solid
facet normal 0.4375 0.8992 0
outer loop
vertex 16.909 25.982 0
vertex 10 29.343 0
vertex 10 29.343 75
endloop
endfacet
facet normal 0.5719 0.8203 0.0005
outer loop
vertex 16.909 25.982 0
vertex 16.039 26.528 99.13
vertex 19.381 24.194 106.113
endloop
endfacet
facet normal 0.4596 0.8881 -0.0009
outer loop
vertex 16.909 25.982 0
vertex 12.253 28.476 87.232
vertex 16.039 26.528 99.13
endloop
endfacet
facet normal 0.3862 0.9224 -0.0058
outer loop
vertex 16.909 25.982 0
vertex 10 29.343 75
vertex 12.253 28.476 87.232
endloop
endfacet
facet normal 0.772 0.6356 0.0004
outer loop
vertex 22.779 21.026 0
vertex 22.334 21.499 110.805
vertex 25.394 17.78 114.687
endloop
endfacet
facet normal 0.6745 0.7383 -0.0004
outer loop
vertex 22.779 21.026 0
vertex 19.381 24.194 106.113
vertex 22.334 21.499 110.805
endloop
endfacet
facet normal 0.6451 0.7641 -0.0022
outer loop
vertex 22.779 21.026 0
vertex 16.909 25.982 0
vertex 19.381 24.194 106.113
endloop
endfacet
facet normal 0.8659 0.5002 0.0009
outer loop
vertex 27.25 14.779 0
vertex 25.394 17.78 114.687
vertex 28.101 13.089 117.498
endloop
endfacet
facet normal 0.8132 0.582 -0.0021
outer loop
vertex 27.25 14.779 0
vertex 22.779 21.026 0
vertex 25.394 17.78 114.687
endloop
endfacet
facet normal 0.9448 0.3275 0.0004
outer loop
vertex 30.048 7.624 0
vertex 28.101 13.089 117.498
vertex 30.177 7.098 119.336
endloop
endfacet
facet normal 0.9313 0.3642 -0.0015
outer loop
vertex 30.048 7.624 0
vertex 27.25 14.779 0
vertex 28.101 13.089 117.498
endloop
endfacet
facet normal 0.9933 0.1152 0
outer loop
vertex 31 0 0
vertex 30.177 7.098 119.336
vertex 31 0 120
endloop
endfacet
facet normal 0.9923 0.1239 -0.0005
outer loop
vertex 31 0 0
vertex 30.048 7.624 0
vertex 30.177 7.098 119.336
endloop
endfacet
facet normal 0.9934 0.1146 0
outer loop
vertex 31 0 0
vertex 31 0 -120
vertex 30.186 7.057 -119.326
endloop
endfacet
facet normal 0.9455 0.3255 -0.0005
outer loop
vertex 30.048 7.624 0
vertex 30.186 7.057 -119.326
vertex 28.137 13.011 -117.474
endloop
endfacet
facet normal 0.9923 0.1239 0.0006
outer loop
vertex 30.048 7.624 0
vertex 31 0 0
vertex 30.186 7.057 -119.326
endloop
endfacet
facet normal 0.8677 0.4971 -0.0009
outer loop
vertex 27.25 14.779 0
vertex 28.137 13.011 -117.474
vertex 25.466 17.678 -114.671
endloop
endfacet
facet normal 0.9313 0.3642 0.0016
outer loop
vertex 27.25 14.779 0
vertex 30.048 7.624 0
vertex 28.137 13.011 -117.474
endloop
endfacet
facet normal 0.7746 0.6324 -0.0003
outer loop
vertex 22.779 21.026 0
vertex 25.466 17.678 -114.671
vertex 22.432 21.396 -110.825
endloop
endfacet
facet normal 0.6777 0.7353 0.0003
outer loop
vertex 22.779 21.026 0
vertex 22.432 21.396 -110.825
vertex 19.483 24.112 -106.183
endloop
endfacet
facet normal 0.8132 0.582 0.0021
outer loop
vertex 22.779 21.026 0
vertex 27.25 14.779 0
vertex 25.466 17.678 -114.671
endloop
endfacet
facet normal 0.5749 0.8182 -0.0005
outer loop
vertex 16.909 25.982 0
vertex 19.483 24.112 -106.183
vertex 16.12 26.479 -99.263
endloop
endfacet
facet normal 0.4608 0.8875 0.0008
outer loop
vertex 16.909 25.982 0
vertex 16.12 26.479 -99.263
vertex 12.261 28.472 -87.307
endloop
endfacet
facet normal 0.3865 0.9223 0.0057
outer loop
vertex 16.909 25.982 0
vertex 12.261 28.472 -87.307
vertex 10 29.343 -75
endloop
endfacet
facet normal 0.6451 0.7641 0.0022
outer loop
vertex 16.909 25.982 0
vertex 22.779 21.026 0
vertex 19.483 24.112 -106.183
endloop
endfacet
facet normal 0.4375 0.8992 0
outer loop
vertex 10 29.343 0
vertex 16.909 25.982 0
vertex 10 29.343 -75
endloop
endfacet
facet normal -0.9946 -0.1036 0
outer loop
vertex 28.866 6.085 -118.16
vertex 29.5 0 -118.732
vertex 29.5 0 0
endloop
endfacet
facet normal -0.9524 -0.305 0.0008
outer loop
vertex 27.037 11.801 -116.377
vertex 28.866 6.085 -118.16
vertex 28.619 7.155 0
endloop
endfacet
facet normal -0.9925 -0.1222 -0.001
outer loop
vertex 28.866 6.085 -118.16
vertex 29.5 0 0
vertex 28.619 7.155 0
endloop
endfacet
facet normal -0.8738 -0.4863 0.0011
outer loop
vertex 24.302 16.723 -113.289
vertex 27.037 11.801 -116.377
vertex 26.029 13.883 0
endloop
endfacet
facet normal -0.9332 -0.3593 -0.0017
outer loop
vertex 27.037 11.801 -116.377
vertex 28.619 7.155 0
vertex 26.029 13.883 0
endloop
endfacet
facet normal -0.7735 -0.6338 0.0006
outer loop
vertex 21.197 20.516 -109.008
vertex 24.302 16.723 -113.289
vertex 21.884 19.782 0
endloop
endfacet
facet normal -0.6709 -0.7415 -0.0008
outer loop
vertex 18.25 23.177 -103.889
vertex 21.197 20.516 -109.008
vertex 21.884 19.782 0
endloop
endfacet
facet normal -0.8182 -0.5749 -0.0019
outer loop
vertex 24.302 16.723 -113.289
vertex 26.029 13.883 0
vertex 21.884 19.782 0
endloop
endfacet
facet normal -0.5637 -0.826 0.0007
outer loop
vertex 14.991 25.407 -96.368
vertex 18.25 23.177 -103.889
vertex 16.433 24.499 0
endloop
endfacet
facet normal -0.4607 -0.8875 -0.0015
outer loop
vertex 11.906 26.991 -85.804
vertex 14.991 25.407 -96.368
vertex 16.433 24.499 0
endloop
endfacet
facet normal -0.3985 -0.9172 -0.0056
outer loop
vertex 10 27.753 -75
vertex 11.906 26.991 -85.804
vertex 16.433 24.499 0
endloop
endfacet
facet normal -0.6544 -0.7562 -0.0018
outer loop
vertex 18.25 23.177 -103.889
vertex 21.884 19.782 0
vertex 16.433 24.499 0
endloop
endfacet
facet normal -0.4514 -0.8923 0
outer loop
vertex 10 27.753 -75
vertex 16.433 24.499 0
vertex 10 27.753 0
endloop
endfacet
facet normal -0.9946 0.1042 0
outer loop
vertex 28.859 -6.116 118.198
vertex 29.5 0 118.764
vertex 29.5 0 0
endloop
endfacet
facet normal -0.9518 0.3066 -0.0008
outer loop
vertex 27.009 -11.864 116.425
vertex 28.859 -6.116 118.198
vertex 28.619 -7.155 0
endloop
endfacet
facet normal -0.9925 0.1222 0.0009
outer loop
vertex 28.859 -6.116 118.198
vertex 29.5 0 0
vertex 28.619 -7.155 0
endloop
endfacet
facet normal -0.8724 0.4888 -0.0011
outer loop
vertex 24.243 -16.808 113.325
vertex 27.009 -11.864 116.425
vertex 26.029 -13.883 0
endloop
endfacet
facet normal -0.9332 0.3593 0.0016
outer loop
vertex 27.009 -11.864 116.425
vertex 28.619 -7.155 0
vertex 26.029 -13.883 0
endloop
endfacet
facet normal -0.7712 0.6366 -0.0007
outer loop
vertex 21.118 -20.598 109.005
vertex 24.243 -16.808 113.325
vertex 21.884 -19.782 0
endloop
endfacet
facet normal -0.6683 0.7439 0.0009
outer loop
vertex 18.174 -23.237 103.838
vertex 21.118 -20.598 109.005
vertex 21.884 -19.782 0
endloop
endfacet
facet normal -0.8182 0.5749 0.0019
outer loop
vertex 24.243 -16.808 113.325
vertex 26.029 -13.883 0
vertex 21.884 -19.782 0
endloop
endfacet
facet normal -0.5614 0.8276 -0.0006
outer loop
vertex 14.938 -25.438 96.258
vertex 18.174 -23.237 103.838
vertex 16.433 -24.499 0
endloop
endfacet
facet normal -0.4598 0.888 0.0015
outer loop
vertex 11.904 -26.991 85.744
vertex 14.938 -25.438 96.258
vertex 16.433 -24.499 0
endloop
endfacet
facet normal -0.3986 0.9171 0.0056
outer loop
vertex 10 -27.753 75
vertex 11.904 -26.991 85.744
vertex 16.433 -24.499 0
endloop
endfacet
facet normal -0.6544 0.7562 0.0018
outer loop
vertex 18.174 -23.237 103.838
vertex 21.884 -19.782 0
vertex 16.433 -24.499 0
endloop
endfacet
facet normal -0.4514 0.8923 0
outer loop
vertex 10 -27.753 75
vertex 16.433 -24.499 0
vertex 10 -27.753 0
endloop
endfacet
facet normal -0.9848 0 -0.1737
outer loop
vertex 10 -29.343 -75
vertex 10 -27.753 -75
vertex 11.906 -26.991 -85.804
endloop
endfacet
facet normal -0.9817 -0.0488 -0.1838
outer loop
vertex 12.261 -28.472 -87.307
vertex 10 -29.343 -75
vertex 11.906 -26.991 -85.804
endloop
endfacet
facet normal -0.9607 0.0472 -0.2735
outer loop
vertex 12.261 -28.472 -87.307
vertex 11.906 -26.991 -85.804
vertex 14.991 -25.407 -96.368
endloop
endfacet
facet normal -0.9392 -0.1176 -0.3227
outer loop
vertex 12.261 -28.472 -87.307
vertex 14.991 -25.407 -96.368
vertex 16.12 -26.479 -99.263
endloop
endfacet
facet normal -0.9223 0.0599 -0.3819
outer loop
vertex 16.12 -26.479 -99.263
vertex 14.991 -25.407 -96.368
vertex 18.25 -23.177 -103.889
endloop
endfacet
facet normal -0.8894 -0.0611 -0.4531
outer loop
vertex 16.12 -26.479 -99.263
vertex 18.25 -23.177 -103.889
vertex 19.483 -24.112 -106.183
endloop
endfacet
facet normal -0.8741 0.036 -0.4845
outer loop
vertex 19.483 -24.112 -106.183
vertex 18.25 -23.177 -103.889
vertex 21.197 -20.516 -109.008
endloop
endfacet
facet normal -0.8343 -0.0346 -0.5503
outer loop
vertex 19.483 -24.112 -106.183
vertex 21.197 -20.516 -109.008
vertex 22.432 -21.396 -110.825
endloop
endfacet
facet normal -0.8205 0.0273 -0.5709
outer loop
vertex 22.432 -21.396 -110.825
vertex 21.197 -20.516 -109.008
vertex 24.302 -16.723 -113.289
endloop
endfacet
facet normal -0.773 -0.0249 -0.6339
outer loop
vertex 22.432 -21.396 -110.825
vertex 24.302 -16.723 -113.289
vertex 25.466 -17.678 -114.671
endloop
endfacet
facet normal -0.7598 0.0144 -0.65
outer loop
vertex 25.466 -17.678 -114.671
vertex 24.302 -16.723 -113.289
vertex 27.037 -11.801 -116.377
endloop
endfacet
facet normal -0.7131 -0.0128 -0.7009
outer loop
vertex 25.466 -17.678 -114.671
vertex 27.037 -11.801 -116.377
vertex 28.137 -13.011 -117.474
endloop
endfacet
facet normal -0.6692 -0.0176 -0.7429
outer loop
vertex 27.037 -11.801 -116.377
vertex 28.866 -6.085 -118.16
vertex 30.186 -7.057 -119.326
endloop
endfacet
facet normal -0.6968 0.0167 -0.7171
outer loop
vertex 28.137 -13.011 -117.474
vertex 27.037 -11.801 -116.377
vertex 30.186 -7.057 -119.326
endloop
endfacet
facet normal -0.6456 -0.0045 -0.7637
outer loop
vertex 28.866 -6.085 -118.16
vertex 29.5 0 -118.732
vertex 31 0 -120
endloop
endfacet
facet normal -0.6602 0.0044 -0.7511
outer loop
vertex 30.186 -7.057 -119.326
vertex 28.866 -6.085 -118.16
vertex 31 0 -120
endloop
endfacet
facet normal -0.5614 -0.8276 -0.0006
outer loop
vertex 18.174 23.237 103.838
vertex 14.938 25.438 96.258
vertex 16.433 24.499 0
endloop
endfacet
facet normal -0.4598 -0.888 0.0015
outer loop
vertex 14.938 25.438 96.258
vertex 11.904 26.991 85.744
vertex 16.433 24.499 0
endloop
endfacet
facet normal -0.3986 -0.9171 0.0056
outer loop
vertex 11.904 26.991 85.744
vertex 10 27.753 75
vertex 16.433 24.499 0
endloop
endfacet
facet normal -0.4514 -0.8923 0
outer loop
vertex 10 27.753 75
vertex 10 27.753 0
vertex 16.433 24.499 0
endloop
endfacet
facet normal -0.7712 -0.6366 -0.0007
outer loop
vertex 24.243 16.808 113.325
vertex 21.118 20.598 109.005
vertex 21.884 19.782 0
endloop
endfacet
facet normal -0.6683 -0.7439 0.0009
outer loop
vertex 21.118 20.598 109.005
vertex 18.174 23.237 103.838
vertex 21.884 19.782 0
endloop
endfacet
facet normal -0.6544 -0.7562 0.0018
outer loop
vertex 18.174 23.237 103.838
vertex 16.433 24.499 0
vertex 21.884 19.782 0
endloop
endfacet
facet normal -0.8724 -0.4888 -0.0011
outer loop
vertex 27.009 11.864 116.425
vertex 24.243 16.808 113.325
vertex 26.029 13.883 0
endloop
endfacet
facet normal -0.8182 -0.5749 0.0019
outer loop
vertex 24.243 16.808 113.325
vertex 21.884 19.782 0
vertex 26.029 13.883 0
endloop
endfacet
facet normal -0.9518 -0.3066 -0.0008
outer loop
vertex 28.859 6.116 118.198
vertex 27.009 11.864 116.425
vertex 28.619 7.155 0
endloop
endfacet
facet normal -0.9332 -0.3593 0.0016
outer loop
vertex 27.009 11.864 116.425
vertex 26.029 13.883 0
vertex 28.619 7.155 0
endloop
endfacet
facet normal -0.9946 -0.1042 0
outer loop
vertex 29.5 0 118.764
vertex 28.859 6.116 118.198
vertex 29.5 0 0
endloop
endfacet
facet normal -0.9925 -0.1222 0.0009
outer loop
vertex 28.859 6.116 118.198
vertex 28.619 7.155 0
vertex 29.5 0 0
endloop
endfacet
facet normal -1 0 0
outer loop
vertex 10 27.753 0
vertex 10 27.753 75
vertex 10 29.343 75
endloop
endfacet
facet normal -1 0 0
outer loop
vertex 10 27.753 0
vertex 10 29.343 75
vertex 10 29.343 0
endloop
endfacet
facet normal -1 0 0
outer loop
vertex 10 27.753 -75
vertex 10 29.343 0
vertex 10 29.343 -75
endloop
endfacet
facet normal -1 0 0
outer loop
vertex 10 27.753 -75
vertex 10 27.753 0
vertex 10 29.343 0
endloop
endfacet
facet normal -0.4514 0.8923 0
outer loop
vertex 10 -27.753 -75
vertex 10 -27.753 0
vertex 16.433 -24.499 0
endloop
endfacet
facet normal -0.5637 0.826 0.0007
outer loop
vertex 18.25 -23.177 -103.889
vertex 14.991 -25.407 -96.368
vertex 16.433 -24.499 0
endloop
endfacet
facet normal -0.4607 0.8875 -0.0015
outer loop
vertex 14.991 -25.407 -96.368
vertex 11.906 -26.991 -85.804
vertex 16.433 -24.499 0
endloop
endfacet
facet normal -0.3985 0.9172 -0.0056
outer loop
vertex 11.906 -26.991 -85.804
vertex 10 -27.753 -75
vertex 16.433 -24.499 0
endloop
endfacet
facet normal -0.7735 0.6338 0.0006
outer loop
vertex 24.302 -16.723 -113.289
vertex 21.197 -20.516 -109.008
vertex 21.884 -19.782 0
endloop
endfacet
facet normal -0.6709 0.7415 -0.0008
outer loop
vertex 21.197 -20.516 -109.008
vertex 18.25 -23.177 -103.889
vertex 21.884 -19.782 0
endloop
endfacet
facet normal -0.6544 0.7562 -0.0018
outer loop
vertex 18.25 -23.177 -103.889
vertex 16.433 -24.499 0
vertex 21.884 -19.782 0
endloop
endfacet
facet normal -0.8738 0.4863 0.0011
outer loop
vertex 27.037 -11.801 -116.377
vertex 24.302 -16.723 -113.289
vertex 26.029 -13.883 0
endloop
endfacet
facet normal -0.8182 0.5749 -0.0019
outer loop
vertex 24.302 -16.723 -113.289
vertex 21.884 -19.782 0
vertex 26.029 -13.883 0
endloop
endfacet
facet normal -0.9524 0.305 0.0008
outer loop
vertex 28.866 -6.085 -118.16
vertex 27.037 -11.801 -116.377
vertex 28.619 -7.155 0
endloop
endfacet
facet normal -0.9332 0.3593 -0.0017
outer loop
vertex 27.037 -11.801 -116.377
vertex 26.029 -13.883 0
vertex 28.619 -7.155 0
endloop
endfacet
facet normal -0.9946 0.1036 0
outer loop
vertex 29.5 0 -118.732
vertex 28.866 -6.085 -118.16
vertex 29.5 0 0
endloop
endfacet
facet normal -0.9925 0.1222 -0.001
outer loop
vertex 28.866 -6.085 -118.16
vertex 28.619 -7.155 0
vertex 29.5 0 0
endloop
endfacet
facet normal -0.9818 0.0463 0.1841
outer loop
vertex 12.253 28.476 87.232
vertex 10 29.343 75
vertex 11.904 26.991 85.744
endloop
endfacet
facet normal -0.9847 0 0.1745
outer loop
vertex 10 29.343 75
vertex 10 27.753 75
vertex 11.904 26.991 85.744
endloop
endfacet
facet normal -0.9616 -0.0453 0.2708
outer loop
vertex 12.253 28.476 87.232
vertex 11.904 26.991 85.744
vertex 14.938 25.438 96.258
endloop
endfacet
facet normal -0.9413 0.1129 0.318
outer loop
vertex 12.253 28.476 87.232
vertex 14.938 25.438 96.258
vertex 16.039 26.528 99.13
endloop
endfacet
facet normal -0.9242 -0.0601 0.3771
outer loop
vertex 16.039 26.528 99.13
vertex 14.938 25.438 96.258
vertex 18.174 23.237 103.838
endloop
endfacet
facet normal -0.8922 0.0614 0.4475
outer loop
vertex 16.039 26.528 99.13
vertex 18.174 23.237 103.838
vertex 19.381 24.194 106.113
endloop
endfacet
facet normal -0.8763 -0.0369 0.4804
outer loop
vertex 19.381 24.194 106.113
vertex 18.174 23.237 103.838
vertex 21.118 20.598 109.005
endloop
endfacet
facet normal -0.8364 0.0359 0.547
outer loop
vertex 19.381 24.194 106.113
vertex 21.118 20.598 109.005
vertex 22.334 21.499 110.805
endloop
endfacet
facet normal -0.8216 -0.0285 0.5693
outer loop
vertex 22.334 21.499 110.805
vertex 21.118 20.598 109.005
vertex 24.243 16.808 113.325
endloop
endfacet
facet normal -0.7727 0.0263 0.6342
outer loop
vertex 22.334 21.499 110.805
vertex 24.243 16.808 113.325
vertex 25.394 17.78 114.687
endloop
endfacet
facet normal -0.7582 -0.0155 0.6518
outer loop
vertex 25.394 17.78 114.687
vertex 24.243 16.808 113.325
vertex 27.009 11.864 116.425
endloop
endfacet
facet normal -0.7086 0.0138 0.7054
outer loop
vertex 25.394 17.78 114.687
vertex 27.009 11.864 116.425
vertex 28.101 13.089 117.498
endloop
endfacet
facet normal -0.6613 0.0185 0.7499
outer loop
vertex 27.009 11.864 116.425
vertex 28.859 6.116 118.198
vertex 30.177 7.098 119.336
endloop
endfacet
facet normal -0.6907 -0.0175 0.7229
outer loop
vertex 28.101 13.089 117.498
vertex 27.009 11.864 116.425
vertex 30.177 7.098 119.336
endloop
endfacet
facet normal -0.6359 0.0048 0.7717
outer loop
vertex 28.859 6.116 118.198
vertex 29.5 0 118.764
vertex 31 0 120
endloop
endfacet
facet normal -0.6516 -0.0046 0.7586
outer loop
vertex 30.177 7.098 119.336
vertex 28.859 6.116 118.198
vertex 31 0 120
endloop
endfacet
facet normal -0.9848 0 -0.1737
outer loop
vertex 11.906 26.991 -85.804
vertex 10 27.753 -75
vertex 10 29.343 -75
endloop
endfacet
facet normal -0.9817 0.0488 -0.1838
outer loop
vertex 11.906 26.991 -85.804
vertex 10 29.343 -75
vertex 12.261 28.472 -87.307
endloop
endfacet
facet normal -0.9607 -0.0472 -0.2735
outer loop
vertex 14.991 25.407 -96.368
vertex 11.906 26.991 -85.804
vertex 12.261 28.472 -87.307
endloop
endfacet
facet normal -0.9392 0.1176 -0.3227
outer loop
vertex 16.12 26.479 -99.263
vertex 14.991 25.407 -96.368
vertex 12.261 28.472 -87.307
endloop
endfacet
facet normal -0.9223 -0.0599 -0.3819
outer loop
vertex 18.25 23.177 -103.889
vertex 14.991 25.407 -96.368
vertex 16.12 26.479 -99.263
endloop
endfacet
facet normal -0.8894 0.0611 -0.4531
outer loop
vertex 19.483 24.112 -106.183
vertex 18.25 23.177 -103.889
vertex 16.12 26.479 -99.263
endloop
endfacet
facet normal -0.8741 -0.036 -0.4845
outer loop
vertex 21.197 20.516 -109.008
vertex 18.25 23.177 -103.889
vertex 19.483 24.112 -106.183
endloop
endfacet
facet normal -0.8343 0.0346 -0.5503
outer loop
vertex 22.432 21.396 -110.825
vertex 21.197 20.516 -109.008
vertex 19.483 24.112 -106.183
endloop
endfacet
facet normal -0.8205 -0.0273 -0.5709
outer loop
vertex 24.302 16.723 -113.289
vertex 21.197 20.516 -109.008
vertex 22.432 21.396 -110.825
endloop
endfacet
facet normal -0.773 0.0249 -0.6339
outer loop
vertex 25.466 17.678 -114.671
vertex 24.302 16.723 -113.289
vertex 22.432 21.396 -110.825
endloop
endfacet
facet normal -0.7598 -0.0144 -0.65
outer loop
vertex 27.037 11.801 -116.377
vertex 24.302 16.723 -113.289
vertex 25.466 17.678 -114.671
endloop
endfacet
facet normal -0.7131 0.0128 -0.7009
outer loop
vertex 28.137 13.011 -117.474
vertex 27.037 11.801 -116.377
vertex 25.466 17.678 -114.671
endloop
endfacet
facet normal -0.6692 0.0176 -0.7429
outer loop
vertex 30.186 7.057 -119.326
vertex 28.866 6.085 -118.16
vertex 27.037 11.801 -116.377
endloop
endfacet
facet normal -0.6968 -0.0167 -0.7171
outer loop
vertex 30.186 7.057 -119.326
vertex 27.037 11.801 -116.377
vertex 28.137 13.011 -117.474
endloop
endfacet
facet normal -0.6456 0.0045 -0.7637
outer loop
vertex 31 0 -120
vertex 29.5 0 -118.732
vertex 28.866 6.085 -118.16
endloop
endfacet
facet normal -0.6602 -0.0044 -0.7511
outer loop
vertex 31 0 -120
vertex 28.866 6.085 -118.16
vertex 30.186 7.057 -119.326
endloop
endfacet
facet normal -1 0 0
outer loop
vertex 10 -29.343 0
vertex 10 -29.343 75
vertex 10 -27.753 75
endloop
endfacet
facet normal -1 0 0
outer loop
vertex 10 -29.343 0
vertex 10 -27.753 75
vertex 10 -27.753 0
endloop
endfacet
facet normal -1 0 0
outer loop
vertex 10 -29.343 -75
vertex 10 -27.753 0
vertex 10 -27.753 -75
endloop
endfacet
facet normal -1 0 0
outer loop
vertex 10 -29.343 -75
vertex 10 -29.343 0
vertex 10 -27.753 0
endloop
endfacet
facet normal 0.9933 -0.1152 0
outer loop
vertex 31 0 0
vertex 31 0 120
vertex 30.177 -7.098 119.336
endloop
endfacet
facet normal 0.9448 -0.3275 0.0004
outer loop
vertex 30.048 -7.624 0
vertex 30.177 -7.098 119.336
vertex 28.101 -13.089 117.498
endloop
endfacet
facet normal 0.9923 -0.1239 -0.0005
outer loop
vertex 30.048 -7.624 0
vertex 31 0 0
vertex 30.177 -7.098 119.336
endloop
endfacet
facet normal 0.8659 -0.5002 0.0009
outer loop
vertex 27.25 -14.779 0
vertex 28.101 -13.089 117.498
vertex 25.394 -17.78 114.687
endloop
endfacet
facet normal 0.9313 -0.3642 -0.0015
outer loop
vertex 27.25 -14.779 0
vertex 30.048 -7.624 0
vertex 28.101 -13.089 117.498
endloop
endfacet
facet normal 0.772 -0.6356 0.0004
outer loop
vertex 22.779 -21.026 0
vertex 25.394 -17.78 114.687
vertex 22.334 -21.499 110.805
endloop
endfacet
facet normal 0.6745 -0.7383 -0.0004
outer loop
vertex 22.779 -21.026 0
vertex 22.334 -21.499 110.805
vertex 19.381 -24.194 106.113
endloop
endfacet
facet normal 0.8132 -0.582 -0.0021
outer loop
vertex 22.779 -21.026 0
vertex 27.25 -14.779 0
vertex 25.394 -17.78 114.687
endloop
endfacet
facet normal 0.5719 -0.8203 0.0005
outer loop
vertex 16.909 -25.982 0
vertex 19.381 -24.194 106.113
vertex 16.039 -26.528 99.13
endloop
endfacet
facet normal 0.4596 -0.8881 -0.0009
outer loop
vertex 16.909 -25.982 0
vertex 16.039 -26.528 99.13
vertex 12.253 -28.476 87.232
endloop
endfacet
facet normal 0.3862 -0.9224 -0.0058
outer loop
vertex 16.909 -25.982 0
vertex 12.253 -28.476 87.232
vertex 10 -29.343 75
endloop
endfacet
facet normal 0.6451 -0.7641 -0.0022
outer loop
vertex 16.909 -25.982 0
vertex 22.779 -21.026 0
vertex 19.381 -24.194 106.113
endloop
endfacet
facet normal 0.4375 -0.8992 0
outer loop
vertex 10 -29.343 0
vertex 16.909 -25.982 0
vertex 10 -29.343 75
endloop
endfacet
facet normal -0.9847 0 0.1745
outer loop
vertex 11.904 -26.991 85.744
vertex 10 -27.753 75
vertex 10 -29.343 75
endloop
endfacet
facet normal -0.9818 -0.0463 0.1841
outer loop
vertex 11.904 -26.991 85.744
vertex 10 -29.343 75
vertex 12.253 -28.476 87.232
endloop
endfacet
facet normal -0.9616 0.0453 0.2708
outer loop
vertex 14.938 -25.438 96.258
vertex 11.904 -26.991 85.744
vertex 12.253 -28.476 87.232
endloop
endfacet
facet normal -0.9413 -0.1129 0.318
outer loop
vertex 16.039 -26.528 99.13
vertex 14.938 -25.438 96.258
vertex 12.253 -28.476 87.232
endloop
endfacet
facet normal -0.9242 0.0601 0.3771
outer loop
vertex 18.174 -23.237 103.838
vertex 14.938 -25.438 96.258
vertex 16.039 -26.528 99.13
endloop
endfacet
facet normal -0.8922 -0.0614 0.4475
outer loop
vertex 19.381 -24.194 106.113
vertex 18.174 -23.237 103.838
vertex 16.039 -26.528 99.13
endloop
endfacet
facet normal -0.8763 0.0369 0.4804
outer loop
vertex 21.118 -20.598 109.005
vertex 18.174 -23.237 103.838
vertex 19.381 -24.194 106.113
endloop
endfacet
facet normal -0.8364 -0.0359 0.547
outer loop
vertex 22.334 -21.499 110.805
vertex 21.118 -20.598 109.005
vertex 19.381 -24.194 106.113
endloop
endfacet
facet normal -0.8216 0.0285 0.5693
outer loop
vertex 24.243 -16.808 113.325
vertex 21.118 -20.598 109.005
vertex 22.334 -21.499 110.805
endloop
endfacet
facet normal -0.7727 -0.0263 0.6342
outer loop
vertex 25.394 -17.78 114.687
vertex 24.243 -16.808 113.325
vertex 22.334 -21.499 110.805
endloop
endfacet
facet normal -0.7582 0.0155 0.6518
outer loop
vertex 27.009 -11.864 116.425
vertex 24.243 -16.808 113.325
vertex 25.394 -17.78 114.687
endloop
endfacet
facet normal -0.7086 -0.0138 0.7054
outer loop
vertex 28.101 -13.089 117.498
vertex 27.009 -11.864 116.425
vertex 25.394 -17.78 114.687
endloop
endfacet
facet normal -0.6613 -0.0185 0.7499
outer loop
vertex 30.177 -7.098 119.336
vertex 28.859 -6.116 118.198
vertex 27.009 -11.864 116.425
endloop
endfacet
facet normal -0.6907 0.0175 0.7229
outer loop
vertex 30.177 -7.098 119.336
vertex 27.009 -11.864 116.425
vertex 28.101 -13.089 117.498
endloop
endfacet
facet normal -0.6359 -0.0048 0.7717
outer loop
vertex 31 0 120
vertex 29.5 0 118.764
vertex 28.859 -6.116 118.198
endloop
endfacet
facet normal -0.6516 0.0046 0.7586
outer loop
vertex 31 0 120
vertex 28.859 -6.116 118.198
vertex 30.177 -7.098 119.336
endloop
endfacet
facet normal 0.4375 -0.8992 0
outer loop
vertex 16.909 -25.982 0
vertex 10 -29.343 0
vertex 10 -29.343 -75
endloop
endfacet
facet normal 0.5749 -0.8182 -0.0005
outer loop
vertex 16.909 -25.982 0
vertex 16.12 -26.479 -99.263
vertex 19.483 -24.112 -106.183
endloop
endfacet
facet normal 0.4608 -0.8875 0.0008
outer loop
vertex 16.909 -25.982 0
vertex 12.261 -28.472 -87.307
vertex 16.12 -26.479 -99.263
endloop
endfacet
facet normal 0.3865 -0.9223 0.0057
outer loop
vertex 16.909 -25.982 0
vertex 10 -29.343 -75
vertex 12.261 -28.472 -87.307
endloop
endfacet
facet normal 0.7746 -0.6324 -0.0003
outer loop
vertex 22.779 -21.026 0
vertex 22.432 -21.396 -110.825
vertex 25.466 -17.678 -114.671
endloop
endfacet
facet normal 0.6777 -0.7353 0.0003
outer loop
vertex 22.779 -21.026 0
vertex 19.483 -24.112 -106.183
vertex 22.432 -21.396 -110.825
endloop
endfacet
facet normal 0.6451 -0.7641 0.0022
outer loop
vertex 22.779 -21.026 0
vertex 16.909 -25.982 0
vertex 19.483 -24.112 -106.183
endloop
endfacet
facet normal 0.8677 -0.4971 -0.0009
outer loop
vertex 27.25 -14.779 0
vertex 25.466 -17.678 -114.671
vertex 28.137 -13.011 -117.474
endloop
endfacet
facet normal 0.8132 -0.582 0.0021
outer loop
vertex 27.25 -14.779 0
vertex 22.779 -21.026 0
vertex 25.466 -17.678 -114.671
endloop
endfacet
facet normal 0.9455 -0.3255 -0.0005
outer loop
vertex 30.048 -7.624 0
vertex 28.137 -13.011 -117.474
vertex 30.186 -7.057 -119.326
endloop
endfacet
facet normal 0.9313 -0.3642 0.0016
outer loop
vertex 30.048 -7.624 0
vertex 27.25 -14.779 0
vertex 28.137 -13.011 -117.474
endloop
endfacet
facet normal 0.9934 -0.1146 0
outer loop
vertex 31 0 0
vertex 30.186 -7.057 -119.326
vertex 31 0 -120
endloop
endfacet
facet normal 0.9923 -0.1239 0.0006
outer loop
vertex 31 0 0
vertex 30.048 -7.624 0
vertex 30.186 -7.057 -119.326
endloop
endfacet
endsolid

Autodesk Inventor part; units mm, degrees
ref_plane "XZ Plane" through (0, 0, 0) normal (0, 1, 0) x (-1, 0, 0)
ref_plane "XY Plane" through (0, 0, 0) normal (0, 0, 1) x (1, 0, 0)
sketch "Skizze1" plane through (0, 0, 0) normal (0, 0, 1) x (1, 0, 0)
  circle A0 centre (0, 0) radius 31
  circle A1 centre (0, 0) radius 29.5
  dimension "d0" = 62
  dimension "d1" = 59
extrude "Extrusion1" add sketch "Skizze1" along normal mid plane 300
sketch "Skizze2" plane through (0, 0, 0) normal (0, 1, 0) x (-1, 0, 0)
  line L0 (-10, 169.5773) -> (-10, -169.8146) construction
  line L1 (-74.8376, 0) -> (82.6362, 0) construction
  line L2 (-10, 75) -> (-10, -75)
  line L3 (-31, -150) -> (-31, 150) projected
  line L4 (31, 150) -> (-31, 150) projected
  line L5 (-31, -150) -> (31, -150) projected
  spline S0 degree 2 poles (-10, 75) (-18.1599, 136.3675) (-72.8449, 128.3193) knots 0 0 0 1 1 1
  spline S1 degree 2 poles (-10, -75) (-17.9565, -136.1553) (-74.8376, -130) knots 0 0 0 1 1 1
  line L6 (-72.8449, 128.3193) -> (-74.8376, -130)
  line L7 (-31, 120) -> (-31, 150)
  line L8 (-31, 150) -> (31, 150)
  line L9 (31, 150) -> (31, -150)
  line L10 (31, -150) -> (31, 150) projected
  line L11 (31, -150) -> (-31, -150)
  line L12 (-31, -150) -> (-31, -120)
  point P0 (0, 0)
  dimension "d4" = 10
  dimension "d5" = 150
  dimension "d6" = 30
  dimension "d7" = 30
extrude "Extrusion3" cut sketch "Skizze2" along normal mid plane 100 contours S0 L3 L4 L9 L5 S1 L2
ref_plane "Arbeitsebene1" through (26.5, 0, 0) normal (1, 0, 0) x (0, 1, 0)
properties part number "_3D-Druck"
